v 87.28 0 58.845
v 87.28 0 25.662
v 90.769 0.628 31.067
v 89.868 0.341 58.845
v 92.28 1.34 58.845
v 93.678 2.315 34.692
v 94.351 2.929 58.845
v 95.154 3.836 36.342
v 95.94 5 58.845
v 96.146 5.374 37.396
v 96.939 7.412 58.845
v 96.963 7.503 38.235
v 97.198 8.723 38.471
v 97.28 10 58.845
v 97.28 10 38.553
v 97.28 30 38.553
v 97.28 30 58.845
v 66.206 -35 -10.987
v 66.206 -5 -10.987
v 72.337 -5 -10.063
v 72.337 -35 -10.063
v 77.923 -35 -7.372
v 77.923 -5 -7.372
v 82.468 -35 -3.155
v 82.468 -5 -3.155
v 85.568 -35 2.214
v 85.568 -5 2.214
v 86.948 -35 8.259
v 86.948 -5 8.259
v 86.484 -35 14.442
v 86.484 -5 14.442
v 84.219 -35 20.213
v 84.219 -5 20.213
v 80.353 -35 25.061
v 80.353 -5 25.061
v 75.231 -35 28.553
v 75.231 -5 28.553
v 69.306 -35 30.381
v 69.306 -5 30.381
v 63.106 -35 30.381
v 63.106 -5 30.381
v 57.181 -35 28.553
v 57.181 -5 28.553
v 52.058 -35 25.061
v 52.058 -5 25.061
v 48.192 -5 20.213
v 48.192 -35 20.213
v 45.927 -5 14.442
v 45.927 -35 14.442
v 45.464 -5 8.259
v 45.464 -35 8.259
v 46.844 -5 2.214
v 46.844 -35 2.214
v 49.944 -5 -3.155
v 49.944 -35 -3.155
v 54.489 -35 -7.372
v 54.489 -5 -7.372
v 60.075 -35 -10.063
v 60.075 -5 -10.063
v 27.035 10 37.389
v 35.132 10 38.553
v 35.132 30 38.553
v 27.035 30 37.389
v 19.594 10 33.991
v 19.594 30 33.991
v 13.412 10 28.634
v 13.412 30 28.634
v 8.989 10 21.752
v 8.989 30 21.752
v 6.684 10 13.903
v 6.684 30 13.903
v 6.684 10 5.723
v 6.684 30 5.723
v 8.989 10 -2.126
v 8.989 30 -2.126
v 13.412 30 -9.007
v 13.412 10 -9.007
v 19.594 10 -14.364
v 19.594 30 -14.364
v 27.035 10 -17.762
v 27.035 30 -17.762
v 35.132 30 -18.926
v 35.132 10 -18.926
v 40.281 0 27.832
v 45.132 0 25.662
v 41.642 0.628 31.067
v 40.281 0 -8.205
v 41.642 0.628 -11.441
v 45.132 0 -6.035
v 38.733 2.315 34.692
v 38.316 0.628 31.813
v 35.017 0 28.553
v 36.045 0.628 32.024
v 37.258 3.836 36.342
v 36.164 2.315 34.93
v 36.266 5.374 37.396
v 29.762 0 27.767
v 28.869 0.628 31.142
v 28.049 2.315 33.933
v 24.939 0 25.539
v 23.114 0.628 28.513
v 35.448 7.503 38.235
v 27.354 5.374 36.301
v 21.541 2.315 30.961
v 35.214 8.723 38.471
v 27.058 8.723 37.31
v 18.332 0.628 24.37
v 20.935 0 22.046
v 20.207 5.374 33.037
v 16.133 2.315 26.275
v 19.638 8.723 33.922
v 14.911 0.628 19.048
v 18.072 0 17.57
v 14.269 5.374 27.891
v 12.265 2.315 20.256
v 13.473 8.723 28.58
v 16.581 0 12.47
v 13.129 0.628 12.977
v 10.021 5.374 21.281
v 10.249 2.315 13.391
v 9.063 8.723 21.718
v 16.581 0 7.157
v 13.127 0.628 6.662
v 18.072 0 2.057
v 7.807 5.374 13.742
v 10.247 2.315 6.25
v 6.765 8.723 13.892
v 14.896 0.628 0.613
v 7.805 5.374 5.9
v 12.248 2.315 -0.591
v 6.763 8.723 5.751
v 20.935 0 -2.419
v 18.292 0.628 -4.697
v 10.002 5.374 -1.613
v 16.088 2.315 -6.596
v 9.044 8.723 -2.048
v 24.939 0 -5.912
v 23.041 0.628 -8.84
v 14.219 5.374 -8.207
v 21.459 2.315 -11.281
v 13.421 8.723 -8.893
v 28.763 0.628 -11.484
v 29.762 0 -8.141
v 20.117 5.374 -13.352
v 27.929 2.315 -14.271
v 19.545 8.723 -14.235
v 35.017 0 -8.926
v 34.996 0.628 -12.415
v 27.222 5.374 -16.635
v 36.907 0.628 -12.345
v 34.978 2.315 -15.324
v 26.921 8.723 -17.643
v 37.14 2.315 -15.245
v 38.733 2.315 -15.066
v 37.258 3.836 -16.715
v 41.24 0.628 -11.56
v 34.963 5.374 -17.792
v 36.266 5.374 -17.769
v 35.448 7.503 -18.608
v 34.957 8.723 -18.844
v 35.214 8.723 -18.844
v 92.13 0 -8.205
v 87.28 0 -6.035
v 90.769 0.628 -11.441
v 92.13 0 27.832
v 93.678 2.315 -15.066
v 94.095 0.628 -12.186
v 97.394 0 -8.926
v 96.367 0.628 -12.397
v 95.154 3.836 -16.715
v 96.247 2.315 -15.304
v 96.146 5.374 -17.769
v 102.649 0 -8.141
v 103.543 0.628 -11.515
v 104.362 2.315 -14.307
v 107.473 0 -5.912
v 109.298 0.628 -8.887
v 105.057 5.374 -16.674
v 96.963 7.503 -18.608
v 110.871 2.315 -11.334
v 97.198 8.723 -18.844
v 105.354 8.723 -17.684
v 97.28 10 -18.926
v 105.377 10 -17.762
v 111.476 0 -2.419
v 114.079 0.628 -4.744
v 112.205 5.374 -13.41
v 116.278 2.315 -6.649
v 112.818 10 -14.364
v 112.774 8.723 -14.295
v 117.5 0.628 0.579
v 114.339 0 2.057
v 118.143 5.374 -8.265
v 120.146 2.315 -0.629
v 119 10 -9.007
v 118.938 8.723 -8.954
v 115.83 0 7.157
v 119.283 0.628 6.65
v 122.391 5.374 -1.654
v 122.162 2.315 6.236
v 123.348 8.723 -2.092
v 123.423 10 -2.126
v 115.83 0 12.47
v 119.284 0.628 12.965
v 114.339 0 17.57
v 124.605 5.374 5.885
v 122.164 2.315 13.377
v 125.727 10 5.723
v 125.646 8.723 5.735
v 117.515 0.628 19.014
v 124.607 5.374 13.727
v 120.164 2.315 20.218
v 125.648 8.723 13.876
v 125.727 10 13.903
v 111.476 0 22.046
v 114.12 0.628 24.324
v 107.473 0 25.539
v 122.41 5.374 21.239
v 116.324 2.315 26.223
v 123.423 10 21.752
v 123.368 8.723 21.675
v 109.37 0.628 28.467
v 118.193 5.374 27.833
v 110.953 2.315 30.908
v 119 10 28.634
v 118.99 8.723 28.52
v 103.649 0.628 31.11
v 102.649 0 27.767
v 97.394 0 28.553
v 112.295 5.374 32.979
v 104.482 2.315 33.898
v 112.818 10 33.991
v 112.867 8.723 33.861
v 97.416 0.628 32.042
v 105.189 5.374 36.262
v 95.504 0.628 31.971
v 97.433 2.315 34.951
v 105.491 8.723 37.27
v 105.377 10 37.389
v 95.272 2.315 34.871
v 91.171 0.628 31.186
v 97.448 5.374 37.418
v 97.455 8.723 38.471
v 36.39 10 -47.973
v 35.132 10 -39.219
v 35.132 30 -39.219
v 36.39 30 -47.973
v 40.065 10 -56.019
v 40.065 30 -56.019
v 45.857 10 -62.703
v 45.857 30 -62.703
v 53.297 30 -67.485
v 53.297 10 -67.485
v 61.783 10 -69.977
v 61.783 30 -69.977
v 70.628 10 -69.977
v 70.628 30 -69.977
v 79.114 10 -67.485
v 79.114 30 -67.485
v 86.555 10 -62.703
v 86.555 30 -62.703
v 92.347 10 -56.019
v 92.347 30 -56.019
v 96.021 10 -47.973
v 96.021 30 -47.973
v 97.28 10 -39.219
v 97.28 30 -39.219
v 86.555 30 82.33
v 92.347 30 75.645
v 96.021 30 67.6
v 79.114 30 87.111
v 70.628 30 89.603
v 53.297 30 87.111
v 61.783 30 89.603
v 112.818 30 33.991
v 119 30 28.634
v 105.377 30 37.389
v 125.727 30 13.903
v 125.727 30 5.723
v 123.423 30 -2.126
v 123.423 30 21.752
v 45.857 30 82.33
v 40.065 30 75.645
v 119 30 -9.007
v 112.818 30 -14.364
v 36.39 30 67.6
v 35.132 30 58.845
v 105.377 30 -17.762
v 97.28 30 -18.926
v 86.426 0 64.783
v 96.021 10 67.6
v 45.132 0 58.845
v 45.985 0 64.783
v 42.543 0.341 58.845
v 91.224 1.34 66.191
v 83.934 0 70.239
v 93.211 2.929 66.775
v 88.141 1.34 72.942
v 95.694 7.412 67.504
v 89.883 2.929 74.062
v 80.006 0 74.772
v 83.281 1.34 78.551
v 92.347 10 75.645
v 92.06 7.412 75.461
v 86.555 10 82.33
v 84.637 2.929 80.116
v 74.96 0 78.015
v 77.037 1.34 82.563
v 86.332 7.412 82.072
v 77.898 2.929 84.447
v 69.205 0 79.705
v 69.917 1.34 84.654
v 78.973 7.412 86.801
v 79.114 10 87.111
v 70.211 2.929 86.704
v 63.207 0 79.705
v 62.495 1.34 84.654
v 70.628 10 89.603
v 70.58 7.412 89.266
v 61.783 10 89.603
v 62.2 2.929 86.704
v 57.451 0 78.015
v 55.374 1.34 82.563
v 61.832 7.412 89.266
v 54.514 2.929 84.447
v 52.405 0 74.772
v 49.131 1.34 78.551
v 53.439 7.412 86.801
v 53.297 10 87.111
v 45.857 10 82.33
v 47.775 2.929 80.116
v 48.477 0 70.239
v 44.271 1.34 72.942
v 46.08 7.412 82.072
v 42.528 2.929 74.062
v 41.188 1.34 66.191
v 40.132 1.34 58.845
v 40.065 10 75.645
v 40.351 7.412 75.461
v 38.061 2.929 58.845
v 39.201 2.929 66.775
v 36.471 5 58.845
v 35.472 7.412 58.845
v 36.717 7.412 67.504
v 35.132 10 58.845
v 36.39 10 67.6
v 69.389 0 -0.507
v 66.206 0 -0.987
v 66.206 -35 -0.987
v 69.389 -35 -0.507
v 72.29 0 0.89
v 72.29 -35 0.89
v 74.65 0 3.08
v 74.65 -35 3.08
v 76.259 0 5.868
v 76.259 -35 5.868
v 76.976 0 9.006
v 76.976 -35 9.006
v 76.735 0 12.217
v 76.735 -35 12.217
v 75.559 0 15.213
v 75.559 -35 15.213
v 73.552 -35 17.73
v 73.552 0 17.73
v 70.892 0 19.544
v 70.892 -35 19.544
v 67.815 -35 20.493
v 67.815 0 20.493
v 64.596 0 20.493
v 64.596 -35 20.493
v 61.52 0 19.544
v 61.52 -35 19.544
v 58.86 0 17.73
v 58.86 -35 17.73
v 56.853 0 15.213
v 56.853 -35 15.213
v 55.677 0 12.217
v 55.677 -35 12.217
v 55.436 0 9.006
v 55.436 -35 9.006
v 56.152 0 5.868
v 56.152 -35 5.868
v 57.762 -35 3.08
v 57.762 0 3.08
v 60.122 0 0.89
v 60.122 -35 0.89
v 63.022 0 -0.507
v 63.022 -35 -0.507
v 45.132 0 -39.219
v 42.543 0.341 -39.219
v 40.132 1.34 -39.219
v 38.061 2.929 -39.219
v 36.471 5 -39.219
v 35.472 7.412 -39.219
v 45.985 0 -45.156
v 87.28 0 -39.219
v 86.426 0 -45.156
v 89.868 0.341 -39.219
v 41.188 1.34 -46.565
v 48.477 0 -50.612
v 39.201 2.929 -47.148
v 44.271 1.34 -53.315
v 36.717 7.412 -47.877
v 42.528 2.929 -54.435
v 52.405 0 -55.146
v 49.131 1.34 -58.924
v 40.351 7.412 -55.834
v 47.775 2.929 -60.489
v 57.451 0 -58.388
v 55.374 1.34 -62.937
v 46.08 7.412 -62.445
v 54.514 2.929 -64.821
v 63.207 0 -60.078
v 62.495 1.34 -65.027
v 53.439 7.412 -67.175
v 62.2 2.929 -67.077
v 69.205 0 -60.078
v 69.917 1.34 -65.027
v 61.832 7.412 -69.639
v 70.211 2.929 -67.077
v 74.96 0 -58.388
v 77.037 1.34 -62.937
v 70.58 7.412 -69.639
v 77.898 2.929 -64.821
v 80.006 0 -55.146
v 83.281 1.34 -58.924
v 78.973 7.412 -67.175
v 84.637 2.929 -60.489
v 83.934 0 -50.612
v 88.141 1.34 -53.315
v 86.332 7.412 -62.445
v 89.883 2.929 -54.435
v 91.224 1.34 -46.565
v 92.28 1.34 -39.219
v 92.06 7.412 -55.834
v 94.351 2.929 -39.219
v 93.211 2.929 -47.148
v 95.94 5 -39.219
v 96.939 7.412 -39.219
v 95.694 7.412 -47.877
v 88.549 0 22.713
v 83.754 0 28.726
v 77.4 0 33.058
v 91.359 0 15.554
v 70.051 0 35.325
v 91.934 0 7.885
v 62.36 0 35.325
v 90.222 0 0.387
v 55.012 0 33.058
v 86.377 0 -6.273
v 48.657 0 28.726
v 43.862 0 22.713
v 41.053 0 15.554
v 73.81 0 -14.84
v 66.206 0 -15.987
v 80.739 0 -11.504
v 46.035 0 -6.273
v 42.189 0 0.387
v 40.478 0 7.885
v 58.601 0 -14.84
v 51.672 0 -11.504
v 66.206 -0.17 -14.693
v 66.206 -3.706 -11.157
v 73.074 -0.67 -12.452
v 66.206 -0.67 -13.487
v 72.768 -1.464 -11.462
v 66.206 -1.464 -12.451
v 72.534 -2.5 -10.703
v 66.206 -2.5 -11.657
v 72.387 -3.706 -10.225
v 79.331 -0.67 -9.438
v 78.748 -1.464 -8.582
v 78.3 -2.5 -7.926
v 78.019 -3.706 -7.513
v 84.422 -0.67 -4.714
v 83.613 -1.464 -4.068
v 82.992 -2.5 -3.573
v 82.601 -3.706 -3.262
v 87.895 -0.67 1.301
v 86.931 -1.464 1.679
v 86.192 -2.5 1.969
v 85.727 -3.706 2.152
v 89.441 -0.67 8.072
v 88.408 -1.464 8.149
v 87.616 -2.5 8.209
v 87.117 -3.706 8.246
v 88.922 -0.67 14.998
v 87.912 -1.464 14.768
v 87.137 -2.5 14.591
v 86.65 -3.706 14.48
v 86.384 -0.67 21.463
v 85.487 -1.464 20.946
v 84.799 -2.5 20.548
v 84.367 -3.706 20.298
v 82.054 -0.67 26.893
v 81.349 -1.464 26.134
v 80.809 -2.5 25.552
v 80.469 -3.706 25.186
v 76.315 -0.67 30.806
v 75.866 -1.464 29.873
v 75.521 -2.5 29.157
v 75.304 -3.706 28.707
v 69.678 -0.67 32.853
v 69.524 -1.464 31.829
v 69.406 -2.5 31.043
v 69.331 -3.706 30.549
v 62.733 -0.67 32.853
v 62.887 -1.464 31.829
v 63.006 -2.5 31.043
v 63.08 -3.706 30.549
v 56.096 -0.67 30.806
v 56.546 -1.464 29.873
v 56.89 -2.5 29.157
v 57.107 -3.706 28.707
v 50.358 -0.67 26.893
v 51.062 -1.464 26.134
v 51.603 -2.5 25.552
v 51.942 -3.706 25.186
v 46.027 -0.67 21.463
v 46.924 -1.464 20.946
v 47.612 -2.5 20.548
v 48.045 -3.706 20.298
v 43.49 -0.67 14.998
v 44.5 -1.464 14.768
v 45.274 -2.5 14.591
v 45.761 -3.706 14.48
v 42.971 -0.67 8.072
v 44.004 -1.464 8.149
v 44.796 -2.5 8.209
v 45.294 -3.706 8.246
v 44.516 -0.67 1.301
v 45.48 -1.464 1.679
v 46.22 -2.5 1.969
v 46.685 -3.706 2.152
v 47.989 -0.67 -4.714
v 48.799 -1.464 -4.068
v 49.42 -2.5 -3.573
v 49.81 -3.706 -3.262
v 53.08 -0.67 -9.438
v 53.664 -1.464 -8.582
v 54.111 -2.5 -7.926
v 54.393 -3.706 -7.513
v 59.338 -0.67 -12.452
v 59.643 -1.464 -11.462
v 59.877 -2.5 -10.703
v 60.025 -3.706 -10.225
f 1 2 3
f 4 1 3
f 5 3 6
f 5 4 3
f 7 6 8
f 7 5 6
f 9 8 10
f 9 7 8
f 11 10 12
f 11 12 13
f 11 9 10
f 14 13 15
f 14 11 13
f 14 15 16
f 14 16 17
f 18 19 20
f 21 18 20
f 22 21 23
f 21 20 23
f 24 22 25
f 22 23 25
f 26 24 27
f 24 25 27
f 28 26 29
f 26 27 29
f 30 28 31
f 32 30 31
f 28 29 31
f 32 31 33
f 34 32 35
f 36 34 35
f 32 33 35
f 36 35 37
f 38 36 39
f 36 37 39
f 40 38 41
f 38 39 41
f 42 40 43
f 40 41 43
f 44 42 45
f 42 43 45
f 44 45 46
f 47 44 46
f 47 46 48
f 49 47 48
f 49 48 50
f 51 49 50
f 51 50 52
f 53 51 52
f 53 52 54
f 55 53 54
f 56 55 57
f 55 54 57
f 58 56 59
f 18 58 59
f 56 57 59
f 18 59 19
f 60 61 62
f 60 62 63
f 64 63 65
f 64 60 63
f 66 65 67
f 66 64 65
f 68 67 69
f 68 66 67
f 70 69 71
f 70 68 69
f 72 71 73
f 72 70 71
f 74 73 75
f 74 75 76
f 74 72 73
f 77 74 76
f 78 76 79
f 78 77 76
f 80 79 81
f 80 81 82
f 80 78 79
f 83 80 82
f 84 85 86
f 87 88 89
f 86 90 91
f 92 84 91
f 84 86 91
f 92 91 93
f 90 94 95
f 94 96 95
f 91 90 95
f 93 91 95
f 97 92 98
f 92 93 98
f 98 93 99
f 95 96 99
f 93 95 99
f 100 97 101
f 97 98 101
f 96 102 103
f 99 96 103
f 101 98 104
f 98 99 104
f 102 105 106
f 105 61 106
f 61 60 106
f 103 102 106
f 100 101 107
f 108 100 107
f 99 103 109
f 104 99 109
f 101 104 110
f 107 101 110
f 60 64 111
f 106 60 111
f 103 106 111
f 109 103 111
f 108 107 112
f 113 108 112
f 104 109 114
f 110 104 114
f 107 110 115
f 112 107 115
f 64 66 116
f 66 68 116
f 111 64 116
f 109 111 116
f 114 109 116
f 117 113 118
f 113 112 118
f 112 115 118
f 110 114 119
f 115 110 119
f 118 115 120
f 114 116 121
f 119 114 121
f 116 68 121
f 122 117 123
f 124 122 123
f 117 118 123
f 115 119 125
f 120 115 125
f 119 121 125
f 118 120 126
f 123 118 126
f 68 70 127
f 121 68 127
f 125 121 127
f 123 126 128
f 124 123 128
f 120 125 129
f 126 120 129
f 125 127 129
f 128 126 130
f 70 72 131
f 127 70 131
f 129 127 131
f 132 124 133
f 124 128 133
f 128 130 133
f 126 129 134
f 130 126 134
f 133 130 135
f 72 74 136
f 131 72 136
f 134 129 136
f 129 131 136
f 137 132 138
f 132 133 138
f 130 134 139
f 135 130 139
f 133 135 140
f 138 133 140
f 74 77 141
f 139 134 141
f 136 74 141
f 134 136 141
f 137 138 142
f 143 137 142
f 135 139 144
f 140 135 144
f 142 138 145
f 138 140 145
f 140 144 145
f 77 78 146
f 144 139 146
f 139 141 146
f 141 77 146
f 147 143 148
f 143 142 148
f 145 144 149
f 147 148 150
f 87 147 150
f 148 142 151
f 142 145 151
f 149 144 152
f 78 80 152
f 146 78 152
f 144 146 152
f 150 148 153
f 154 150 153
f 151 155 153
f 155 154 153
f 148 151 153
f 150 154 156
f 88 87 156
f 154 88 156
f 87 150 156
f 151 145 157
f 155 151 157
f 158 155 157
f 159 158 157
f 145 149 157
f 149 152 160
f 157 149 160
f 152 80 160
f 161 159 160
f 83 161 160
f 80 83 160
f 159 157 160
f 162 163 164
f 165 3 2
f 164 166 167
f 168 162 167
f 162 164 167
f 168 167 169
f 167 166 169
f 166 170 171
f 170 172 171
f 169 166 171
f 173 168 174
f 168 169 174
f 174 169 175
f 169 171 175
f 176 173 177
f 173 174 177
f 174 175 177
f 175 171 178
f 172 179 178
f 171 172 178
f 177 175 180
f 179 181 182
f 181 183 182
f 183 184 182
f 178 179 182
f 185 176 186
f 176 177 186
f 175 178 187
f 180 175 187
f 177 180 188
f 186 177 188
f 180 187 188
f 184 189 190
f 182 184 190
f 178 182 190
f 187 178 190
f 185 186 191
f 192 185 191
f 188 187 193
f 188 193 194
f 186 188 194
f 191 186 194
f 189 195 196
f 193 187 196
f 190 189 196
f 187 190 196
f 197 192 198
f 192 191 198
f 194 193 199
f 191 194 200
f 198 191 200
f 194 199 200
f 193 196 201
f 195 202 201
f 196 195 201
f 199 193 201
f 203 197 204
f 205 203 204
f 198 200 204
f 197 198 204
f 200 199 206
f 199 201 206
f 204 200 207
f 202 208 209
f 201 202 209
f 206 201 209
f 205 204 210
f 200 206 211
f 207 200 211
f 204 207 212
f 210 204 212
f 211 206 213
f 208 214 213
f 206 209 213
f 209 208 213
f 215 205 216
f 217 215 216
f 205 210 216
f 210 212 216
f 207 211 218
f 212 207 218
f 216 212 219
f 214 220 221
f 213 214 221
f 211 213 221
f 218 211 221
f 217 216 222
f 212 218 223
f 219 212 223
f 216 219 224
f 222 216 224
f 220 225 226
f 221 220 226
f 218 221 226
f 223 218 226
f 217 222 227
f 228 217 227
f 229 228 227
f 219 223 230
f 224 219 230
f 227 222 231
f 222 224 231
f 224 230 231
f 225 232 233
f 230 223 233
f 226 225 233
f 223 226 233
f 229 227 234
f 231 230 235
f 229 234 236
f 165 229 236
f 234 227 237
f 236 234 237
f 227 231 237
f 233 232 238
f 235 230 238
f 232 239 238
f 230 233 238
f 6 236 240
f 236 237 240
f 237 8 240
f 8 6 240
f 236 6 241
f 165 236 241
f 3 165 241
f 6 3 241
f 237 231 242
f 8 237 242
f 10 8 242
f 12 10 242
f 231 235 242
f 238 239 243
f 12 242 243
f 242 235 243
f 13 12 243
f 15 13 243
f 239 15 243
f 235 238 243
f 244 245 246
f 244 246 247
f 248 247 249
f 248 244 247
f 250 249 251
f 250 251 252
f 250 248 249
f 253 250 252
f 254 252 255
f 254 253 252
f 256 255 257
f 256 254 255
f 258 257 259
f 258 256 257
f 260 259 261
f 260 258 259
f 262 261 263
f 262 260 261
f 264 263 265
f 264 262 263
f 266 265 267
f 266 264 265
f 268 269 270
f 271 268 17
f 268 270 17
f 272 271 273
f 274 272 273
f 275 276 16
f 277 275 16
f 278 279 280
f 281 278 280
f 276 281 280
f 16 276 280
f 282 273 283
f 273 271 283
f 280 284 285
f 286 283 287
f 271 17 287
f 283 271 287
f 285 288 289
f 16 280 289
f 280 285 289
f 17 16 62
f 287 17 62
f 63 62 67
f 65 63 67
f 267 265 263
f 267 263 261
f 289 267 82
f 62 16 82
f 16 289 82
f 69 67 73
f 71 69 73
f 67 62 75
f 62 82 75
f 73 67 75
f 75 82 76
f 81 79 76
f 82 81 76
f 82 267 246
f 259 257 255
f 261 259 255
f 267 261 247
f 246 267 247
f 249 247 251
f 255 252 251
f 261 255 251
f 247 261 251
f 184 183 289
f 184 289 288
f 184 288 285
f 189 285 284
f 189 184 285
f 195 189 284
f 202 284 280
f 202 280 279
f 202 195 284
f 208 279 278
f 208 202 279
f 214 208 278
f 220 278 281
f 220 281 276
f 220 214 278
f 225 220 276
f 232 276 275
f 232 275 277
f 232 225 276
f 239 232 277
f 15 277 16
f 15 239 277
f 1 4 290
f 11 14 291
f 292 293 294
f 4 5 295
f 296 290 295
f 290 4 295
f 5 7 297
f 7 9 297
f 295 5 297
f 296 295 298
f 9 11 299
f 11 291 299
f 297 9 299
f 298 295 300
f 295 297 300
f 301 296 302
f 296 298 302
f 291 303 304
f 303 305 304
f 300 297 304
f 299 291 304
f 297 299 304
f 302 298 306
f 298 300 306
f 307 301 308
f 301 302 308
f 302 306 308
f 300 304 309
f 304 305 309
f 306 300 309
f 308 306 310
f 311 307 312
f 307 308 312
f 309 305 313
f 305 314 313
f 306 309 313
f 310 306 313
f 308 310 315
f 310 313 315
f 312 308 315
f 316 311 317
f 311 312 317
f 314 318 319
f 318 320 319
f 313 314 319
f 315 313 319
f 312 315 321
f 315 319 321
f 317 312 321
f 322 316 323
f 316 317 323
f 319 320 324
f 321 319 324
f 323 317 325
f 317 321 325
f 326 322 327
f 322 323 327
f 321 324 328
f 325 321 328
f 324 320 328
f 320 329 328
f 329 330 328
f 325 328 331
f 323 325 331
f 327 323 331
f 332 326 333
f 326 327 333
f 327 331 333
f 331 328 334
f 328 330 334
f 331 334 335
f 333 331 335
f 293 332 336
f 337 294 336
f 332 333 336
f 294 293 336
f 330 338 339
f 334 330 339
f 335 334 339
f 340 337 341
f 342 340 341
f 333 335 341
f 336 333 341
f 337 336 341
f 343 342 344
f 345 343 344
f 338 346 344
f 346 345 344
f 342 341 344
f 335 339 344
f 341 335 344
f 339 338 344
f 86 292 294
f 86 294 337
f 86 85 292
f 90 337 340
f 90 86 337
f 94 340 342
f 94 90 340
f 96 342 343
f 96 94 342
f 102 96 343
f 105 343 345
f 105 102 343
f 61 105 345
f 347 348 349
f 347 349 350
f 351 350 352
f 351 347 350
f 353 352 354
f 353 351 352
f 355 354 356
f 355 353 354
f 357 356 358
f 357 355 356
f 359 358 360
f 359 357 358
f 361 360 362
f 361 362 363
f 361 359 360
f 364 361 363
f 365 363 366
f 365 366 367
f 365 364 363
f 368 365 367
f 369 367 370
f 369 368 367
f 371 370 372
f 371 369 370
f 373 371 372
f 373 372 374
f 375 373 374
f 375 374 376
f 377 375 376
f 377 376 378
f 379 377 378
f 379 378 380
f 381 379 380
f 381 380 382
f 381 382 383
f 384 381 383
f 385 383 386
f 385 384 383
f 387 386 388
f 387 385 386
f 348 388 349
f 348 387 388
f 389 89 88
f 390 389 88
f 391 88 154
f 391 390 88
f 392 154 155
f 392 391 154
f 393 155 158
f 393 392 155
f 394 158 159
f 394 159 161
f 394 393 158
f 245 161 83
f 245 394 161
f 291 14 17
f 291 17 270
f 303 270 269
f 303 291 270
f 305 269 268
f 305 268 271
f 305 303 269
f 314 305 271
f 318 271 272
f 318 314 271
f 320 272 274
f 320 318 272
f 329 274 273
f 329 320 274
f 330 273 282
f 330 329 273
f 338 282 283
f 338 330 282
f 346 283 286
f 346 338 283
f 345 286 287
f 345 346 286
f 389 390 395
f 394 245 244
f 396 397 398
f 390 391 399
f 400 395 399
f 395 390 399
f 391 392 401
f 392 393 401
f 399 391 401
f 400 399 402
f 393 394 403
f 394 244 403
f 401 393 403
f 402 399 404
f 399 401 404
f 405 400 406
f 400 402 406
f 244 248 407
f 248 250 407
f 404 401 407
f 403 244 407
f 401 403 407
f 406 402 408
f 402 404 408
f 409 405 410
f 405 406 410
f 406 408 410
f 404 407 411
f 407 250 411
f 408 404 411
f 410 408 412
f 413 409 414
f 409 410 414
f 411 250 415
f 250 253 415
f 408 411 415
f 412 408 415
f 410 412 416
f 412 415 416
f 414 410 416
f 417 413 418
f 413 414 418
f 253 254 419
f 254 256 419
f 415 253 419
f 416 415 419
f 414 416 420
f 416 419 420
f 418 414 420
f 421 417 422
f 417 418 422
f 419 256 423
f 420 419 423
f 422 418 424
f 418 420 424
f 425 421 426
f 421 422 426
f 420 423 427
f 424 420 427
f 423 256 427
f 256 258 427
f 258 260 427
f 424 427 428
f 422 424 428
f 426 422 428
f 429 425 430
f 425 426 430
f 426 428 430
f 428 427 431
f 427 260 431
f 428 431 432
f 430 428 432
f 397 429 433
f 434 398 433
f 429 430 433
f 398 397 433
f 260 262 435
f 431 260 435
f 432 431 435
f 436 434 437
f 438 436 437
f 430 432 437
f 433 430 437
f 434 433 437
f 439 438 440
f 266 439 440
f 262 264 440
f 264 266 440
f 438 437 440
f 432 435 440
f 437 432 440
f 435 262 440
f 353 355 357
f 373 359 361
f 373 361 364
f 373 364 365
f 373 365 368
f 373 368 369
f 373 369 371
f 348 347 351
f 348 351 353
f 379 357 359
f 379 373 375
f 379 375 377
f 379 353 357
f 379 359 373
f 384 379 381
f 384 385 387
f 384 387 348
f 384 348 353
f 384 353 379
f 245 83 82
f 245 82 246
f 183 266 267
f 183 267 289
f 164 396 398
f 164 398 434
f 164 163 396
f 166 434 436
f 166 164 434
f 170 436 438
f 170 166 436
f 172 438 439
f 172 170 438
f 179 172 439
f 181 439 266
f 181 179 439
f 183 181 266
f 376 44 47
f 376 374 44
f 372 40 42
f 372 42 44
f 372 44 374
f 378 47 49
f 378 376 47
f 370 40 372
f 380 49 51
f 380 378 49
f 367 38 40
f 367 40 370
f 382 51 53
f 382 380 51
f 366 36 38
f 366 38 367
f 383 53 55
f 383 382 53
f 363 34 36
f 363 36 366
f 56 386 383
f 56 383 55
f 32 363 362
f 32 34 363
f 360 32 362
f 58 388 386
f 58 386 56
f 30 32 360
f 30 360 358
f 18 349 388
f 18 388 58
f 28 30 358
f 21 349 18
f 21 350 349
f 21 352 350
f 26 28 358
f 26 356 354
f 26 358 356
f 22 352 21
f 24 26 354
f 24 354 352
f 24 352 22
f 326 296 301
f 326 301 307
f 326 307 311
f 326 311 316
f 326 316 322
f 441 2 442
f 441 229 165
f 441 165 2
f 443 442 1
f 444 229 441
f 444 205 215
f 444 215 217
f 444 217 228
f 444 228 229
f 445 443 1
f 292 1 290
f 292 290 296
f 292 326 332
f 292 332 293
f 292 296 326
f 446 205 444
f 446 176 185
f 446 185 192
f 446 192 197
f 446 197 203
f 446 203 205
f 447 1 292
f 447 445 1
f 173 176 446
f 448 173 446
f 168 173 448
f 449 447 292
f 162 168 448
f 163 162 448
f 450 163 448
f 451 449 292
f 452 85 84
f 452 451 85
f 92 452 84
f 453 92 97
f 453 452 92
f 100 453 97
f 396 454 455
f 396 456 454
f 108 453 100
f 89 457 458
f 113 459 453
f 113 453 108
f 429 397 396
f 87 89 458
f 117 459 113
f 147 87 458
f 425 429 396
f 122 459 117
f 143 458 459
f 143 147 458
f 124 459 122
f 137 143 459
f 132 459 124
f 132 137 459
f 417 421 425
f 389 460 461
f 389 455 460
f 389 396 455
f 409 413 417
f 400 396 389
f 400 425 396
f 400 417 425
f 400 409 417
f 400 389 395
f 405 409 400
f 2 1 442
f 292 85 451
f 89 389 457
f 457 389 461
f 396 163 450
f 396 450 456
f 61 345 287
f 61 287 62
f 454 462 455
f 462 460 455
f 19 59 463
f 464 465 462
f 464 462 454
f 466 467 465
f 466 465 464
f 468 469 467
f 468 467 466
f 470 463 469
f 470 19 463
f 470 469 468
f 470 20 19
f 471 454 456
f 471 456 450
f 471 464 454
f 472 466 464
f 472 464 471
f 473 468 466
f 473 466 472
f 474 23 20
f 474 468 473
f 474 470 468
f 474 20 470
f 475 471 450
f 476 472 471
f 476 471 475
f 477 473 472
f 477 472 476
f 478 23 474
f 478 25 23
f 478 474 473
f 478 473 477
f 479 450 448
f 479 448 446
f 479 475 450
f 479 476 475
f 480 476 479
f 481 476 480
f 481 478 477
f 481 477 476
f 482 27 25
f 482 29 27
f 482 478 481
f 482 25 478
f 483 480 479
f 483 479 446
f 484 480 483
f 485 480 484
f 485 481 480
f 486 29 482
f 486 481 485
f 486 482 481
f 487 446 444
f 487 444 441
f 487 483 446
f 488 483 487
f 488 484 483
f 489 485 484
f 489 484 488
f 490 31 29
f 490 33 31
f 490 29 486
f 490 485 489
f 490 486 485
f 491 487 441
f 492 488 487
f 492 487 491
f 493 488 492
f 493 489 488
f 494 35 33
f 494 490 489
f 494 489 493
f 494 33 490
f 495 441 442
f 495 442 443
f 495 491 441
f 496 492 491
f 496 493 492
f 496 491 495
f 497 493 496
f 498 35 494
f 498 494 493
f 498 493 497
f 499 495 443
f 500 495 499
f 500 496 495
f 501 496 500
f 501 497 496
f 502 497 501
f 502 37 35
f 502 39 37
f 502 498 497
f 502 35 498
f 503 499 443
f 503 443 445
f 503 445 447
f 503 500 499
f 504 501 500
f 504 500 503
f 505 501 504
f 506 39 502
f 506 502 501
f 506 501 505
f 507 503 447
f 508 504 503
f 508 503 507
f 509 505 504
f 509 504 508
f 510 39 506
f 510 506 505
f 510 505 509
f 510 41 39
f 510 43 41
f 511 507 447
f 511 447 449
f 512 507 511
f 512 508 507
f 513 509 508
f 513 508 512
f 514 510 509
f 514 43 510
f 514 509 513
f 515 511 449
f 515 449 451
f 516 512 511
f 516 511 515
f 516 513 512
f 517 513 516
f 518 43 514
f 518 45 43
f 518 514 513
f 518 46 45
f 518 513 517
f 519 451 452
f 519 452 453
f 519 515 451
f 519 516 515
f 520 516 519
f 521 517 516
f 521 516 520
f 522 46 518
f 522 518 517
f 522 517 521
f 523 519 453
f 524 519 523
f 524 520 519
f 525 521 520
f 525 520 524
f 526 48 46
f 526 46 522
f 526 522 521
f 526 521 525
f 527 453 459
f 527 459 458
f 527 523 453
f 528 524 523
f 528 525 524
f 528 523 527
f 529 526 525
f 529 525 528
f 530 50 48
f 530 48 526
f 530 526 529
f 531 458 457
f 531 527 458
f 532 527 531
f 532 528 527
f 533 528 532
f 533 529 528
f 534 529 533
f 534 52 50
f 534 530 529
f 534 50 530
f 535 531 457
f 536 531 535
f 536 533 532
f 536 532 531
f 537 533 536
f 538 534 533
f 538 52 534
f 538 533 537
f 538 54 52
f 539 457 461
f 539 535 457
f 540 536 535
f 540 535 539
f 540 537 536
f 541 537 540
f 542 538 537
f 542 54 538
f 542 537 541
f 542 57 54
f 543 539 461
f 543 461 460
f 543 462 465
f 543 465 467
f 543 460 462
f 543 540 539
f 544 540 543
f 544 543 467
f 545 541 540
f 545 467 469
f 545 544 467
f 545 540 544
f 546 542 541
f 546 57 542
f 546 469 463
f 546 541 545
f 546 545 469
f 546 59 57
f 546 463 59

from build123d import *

# Parameters (mm, degrees)
SALIENTE_EXTRUIR1_DEPTH = 30
CROQUIS3_R              = 20.8
CROQUIS3_R_2            = 10.8
SALIENTE_EXTRUIR2_DEPTH = 35
REDONDEO1_R             = 5
REDONDEO4_R             = 10


with BuildPart() as part:
    # Croquis2 → Saliente-Extruir1 (new body)
    with BuildSketch(Plane(origin=(0, 0, 0), x_dir=(1, 0, 0), z_dir=(0, 1, 0))):
        with BuildLine():
            Line((35.131604566, 18.926463751), (35.131604566, 39.218716838))
            ThreePointArc((35.131604566, 39.218716838), (66.20576122, 70.292873492), (97.279917874, 39.218716838))
            Line((97.279917874, 39.218716838), (97.279917874, 18.926463751))
            ThreePointArc((97.279917874, 18.926463751), (126.019675086, -9.813293461), (97.279917874, -38.553050674))
            Line((97.279917874, -38.553050674), (97.279917874, -58.84530376))
            ThreePointArc((97.279917874, -58.84530376), (66.20576122, -89.919460414), (35.131604566, -58.84530376))
            Line((35.131604566, -58.84530376), (35.131604566, -38.553050674))
            ThreePointArc((35.131604566, -38.553050674), (6.391847353, -9.813293461), (35.131604566, 18.926463751))
        make_face()
    extrude(amount=SALIENTE_EXTRUIR1_DEPTH)

    # Croquis3 → Saliente-Extruir2 (add)
    with BuildSketch(Plane.XZ):
        with Locations(Location((66.20576122, 9.813293461, 0), (0, 0, 270))):
            Circle(CROQUIS3_R)
        with Locations(Location((66.20576122, 9.813293461, 0), (0, 0, 270))):
            Circle(CROQUIS3_R_2, mode=Mode.SUBTRACT)
    extrude(amount=SALIENTE_EXTRUIR2_DEPTH)

    # Redondeo1
    redondeo1_edges = [part.edges().sort_by_distance(p)[0] for p in [
        (66.20576122, 0, 30.613293461),
    ]]
    fillet(redondeo1_edges, radius=REDONDEO1_R)

    # Redondeo4
    redondeo4_edges = [part.edges().sort_by_distance(p)[0] for p in [
        (35.131604566, 0, 48.699177217),
        (6.391847353, 0, 9.813293461),
        (35.131604566, 0, -29.072590294),
        (66.20576122, 0, -70.292873492),
        (97.279917874, 0, -29.072590294),
        (126.019675086, 0, 9.813293461),
        (97.279917874, 0, 48.699177217),
        (66.20576122, 0, 89.919460414),
    ]]
    fillet(redondeo4_edges, radius=REDONDEO4_R)


solid = part.part
